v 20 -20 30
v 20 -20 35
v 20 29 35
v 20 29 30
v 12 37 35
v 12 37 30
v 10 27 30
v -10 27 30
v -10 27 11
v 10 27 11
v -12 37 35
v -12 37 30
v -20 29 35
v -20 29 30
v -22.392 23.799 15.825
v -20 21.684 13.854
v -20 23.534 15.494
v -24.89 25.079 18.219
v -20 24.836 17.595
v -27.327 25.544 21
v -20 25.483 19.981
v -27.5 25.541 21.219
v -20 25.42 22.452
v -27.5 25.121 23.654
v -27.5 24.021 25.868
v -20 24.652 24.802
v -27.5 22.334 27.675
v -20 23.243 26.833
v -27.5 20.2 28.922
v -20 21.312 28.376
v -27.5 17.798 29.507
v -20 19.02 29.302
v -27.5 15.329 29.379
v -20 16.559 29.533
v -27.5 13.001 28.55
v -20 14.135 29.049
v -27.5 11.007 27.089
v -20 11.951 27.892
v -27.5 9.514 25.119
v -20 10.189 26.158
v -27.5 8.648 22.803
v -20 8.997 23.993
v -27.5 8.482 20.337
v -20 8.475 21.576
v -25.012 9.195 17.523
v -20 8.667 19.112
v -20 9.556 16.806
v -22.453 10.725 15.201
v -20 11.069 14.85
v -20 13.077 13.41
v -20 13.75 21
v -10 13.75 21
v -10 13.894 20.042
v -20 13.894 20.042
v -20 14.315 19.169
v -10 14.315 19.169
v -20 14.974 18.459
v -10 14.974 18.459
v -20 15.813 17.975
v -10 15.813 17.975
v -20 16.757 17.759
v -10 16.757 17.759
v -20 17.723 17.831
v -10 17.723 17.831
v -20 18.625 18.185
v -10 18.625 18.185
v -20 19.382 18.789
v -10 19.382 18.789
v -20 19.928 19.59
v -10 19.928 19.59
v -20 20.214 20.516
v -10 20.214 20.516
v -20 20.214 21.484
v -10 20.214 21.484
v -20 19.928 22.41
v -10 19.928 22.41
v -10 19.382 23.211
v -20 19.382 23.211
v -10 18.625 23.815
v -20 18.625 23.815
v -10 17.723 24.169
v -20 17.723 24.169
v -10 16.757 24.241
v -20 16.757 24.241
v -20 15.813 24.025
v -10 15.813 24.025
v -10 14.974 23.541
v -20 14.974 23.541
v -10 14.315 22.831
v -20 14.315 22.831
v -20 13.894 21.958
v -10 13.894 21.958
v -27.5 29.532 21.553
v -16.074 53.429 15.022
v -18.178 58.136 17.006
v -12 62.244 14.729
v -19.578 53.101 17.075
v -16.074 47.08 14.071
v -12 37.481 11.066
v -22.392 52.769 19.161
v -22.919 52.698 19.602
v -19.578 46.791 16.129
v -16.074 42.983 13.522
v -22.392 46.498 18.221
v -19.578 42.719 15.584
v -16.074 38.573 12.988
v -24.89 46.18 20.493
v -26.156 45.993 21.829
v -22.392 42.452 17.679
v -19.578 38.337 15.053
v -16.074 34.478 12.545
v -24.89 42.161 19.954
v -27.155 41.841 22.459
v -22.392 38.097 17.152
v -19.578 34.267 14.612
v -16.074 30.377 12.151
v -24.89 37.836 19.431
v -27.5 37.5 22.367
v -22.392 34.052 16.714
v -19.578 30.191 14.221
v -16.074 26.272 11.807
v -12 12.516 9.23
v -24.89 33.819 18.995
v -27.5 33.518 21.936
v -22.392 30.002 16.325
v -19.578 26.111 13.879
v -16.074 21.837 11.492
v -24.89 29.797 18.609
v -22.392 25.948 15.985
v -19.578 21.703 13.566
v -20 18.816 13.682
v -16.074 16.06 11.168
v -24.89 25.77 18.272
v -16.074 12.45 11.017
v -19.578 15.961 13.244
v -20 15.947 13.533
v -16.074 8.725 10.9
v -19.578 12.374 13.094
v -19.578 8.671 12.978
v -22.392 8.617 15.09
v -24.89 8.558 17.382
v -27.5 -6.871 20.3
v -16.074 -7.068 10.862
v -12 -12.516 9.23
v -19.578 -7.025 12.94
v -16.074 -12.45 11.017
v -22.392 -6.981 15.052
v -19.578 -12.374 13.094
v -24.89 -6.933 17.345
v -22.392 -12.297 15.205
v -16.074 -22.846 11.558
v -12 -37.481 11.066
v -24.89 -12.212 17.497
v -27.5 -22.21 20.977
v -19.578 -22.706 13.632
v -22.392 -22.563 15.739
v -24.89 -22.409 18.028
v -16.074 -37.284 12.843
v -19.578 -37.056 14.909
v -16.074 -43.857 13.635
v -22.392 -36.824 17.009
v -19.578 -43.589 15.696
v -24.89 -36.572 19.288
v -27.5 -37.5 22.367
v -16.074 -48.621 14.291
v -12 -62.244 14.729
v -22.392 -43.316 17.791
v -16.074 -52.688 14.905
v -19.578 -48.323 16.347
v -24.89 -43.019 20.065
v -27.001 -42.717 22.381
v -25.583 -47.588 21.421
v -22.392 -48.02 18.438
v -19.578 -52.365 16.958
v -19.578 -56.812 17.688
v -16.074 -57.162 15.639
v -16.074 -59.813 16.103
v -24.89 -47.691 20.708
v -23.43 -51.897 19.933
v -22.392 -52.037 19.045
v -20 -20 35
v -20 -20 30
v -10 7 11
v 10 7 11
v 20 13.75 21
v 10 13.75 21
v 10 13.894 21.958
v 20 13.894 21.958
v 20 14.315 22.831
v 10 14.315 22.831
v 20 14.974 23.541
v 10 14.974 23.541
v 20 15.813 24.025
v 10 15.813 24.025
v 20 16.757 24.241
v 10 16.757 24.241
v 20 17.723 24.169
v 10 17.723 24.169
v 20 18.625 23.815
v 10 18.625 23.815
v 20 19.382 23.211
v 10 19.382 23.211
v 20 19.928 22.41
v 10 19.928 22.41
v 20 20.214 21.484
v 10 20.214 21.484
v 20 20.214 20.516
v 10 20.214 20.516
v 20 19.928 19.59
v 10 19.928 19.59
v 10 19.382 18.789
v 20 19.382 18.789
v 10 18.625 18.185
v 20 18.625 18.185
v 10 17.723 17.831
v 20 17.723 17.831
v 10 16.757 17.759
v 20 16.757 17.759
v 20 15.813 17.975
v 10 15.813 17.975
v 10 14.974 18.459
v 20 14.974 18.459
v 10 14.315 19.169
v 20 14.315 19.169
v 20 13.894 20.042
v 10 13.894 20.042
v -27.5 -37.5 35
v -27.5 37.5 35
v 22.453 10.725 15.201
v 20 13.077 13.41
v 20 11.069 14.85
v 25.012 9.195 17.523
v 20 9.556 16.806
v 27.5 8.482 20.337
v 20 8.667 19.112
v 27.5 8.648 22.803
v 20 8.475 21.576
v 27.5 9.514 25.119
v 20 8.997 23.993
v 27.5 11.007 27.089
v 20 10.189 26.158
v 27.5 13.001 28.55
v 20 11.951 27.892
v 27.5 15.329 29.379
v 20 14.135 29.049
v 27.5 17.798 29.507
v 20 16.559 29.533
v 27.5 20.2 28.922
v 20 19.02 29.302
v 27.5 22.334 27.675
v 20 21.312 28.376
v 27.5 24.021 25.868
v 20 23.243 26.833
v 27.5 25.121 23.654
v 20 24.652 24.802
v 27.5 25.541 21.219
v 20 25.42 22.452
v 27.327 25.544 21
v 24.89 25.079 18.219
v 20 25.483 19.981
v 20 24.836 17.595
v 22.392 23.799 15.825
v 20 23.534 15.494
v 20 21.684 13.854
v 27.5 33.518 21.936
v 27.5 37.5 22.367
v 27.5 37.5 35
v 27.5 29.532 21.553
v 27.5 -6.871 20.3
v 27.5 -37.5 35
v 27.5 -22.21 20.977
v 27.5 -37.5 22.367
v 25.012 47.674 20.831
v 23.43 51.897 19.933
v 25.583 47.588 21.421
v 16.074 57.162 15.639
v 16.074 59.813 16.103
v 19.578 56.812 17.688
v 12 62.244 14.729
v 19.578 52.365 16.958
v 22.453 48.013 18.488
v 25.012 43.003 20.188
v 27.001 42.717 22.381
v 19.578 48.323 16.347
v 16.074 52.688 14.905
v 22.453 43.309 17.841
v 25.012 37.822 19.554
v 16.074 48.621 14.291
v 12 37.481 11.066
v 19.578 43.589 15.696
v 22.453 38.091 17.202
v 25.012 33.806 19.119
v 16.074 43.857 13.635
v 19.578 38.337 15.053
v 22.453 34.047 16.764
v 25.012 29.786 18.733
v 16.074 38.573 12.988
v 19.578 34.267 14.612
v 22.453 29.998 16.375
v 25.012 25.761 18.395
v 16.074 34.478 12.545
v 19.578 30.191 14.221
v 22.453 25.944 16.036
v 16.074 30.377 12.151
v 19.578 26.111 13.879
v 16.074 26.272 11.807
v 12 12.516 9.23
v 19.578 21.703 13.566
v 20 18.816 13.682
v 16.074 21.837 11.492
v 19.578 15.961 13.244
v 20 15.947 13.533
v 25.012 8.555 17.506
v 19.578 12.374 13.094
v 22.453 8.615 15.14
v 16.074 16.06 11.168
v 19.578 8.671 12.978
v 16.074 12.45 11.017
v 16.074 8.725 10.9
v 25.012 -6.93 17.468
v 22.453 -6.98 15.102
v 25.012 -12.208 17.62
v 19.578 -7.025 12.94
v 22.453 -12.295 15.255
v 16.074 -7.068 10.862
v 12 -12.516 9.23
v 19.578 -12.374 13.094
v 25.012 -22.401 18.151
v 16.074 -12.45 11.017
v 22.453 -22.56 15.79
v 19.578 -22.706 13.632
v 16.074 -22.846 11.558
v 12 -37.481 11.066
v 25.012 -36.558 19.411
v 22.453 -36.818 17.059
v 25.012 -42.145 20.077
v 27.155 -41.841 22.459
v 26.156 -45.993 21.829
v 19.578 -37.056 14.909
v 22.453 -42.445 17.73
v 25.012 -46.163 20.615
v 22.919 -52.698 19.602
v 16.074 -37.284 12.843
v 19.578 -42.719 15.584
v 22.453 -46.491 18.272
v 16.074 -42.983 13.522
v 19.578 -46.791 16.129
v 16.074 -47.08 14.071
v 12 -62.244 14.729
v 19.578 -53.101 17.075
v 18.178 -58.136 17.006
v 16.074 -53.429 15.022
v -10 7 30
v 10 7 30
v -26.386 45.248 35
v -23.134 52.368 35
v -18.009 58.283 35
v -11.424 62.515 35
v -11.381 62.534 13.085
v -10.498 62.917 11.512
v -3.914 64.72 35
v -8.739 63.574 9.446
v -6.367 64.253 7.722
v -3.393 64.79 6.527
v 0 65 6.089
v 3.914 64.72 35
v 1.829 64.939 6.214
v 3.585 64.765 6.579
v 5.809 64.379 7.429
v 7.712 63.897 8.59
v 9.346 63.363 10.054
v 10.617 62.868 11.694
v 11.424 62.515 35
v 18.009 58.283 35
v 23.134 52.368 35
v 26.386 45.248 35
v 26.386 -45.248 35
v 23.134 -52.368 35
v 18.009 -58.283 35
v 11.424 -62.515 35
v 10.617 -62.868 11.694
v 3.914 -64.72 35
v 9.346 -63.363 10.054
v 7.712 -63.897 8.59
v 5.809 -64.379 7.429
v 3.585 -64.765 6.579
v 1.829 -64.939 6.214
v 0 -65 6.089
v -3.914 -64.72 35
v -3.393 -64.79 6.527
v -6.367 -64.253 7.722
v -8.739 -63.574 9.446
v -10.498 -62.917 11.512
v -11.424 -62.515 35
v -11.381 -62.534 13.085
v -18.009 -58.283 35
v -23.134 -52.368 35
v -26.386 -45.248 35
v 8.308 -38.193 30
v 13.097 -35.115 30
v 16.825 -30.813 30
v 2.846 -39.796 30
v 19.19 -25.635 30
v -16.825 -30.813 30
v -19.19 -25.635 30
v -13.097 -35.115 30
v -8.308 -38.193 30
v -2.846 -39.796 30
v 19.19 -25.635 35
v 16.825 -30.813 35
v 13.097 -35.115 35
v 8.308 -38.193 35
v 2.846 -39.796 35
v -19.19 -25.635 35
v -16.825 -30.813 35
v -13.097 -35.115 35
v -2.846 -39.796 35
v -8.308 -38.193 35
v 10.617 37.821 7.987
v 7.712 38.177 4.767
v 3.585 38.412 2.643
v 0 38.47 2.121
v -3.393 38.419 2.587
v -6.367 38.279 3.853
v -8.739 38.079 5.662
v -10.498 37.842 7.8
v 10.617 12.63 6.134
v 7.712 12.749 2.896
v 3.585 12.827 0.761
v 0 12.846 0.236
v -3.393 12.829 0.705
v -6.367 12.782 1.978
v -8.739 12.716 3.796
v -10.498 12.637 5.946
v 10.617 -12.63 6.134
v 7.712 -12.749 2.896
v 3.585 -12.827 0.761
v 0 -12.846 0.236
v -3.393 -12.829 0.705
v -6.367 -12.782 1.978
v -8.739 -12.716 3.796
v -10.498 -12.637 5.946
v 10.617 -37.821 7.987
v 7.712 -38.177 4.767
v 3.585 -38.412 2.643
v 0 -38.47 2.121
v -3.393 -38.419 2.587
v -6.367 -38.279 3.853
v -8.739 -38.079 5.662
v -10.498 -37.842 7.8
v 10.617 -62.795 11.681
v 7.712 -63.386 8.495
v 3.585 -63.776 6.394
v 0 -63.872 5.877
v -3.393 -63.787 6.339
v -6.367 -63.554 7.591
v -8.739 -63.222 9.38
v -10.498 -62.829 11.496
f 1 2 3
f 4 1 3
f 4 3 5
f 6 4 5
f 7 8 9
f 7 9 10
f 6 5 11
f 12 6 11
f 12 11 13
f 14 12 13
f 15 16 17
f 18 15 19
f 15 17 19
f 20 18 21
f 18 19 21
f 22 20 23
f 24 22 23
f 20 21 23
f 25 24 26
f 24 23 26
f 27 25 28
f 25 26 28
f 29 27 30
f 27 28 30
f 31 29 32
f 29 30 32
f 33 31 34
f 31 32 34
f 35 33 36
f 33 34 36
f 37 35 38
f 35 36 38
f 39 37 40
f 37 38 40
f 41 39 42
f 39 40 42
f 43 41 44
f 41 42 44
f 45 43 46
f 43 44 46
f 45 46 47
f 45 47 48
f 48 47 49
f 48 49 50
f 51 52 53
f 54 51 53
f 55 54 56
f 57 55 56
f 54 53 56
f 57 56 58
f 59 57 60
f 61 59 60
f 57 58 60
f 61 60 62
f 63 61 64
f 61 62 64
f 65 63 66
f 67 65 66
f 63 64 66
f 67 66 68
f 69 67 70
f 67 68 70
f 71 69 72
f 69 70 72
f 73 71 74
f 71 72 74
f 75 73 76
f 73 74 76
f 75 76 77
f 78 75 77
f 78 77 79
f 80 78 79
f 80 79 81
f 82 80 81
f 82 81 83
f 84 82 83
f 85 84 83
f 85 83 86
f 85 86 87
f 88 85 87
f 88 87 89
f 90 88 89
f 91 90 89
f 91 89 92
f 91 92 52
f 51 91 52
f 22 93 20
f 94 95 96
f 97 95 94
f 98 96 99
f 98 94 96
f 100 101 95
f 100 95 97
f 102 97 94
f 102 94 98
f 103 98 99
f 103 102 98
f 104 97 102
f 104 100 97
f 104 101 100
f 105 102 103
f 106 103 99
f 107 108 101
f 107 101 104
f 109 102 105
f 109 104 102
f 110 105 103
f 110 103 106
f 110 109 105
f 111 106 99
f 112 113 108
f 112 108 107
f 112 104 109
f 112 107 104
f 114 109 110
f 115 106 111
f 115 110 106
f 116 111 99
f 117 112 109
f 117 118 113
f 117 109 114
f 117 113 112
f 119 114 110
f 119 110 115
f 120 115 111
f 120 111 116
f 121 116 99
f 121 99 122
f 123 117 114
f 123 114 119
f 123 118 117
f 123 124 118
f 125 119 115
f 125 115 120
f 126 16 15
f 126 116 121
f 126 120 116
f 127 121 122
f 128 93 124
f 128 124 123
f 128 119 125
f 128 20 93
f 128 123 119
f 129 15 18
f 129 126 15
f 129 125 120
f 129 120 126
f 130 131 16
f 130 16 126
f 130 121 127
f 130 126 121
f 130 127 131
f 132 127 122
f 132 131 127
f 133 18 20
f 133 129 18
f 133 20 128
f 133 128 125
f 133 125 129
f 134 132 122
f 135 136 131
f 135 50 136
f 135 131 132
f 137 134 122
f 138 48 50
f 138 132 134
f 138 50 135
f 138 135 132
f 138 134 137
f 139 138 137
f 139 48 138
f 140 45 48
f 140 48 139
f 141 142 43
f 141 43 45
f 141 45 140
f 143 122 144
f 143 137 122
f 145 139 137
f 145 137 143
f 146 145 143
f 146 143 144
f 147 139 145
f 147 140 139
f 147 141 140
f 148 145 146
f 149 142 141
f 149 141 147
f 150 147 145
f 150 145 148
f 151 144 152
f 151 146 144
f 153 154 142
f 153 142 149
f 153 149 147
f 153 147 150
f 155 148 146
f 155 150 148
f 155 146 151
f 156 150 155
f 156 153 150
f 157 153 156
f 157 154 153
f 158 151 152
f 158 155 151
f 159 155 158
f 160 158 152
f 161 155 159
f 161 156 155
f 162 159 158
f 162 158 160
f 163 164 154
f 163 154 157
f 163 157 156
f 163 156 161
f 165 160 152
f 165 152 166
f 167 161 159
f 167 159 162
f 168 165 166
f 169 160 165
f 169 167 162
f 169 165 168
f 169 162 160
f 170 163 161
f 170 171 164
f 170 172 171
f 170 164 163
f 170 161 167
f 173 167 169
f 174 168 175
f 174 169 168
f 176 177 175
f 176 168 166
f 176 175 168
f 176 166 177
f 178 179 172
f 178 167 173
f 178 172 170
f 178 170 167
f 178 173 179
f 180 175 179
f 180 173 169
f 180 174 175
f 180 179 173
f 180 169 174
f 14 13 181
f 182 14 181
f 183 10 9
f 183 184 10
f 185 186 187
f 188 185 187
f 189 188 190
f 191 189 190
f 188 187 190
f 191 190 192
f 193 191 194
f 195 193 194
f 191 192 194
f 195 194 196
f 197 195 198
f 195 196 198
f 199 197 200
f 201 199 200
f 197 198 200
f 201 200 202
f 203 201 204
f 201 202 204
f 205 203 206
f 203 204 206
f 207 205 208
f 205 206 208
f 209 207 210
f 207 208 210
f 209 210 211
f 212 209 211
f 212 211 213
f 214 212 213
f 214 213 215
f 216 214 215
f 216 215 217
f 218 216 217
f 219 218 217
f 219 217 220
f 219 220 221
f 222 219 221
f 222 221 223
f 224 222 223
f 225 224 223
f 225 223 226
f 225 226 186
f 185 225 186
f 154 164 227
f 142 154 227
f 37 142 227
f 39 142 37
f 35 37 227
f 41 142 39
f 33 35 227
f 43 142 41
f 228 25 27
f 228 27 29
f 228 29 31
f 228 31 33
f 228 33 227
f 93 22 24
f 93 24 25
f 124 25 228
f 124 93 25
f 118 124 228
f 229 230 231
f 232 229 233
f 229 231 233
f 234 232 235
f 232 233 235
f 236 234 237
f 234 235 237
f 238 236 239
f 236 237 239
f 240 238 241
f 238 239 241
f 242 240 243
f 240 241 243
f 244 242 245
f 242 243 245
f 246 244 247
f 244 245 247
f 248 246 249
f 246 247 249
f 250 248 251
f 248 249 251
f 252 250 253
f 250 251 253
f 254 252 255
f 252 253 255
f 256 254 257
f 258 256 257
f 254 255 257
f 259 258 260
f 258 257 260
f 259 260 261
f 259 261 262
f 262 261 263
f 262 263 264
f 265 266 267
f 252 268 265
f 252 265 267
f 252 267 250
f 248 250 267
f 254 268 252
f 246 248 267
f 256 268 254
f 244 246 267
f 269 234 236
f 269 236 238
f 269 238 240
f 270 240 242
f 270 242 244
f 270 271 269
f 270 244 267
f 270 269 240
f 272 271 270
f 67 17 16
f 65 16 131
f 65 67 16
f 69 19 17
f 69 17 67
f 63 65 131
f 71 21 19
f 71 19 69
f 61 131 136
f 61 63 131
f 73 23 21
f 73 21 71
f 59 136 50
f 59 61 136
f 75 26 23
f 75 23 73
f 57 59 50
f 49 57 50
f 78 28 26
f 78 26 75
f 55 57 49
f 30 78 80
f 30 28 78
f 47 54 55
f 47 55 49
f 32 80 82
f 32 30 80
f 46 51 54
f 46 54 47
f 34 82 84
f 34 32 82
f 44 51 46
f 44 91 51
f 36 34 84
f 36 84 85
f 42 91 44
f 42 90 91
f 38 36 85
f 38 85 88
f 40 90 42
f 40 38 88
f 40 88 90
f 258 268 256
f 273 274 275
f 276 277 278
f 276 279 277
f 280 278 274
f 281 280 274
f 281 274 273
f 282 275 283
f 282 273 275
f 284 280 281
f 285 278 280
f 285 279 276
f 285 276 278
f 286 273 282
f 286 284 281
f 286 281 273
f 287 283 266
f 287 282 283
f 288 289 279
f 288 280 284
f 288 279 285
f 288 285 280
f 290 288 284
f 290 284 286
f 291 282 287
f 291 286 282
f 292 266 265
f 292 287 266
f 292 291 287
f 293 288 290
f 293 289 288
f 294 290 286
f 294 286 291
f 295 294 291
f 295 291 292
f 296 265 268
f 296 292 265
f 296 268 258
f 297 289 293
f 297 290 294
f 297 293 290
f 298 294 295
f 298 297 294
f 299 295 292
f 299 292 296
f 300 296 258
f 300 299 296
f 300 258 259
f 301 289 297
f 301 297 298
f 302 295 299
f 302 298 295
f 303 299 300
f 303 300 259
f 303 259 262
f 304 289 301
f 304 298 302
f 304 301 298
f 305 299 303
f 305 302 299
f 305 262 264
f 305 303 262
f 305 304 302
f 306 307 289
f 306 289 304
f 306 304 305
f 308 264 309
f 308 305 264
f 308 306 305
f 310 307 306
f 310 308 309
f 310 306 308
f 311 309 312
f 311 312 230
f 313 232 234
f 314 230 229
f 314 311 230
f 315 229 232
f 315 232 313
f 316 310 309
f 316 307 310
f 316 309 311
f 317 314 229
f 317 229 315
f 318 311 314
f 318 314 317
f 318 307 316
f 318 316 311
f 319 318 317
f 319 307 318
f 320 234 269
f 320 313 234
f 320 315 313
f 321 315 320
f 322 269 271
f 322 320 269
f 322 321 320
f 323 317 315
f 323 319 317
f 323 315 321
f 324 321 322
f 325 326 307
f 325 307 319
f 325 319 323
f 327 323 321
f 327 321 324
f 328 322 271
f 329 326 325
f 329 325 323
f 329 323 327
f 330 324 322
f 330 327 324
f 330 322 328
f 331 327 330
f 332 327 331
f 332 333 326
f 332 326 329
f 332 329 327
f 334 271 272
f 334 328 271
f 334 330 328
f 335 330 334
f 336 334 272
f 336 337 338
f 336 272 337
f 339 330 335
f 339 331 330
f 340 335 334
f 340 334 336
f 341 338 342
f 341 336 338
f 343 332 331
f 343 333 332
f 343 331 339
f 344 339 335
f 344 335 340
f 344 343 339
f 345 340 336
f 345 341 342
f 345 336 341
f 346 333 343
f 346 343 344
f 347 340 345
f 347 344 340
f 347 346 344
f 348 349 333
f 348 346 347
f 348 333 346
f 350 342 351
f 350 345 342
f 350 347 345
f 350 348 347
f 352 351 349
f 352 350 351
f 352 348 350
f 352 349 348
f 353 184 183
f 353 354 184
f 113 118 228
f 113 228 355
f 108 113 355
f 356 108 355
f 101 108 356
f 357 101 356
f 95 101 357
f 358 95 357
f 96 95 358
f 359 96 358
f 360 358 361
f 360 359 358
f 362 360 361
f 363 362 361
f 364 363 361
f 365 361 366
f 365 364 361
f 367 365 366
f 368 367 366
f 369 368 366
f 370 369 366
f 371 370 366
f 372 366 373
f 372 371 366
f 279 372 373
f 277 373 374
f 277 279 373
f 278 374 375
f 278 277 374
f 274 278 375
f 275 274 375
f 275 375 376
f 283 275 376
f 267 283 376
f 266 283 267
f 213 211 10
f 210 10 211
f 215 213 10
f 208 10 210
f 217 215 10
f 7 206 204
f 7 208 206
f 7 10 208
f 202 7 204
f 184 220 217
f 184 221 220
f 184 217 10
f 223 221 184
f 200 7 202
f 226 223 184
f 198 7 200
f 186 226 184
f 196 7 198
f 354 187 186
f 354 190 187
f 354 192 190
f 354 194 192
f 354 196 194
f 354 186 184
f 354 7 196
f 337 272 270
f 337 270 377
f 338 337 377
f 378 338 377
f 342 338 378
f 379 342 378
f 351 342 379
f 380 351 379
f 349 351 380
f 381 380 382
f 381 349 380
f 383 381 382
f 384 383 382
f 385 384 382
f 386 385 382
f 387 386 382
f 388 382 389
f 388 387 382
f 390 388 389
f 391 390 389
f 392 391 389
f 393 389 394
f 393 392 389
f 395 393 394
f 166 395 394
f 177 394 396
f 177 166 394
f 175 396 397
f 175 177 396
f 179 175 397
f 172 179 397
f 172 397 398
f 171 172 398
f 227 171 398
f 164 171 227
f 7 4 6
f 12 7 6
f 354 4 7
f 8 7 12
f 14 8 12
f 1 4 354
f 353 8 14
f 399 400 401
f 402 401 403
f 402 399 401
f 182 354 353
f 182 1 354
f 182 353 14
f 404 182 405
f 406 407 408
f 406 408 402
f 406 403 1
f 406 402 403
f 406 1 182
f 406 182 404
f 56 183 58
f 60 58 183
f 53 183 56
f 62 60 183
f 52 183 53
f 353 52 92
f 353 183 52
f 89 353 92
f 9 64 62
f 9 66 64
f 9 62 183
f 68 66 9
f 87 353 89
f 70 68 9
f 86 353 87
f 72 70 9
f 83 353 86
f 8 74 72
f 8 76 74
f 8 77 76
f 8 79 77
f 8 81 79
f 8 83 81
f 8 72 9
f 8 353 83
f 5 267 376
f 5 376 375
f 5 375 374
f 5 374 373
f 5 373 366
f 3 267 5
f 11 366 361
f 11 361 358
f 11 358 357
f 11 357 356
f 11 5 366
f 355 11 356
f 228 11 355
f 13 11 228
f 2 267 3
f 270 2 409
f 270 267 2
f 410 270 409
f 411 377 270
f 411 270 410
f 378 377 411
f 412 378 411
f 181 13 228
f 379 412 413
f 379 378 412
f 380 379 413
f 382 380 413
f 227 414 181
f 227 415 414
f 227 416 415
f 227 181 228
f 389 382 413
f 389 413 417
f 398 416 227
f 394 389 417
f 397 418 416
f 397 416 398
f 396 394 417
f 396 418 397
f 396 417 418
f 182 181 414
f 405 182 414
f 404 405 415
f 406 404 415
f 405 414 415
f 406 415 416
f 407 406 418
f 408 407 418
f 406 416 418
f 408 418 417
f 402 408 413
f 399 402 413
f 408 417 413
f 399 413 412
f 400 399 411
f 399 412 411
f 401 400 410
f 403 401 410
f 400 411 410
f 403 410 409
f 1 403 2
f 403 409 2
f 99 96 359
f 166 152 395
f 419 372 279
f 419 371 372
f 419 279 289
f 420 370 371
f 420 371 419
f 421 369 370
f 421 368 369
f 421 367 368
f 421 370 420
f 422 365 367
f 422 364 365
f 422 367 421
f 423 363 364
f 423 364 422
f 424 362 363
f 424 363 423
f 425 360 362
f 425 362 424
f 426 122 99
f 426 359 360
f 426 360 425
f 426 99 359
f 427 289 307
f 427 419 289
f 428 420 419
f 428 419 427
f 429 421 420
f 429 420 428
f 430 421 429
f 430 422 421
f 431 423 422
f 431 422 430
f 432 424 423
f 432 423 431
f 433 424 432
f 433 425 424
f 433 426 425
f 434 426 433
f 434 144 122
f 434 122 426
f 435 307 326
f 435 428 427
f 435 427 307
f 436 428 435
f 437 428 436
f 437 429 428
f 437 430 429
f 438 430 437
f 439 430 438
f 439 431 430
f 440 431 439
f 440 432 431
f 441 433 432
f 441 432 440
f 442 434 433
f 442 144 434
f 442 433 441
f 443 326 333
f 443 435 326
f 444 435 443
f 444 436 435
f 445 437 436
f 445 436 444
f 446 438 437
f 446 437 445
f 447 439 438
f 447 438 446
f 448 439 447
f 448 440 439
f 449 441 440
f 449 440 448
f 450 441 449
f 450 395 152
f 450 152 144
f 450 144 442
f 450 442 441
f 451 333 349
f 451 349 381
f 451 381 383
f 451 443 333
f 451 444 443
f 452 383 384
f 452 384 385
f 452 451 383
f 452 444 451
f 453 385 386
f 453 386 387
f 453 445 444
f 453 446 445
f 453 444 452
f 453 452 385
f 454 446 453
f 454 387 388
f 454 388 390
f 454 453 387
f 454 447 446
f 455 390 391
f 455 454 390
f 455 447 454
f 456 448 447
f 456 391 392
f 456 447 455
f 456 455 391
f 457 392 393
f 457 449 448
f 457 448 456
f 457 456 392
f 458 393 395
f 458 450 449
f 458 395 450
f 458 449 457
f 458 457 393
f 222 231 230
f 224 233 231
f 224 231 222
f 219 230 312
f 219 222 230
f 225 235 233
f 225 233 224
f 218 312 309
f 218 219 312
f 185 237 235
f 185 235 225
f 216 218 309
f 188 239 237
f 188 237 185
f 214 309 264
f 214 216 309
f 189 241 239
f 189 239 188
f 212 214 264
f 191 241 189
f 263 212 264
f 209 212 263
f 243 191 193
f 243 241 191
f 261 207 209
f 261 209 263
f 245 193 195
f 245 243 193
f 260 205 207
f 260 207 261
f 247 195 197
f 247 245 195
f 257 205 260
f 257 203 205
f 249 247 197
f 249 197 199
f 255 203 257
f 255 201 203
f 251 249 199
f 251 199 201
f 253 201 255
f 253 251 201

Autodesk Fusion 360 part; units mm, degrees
sketch "スケッチ2" plane through (0, 0, 0) normal (0, 0, 1) x (1, 0, 0)
  line L0 (27.5, 37.5) -> (27.5, -37.5)
  line L1 (-27.5, -37.5) -> (-27.5, 37.5)
  arc A0 (27.5, 37.5) -> (-27.5, 37.5) centre (0, 37.5) ccw
  arc A1 (-27.5, -37.5) -> (27.5, -37.5) centre (0, -37.5) ccw
  dimension "d2" = 27.5
  dimension "d3" = 75
  dimension "d4" = 37.5
extrude "押し出し1" add sketch "スケッチ2" along normal blind 50
sketch "スケッチ3" plane through (0, 0, 50) normal (0, 0, 1) x (-1, 0, 0)
  arc A0 (-27.5, -37.5) -> (27.5, -37.5) centre (0, -37.5) ccw
  line L0 (27.5, -37.5) -> (27.5, 37.5)
  arc A1 (27.5, 37.5) -> (-27.5, 37.5) centre (0, 37.5) ccw
  line L1 (-27.5, 37.5) -> (-27.5, -37.5)
  line L2 (20, -29) -> (20, 20)
  arc A2 (20, 20) -> (-20, 20) centre (0, 20) ccw
  line L3 (-20, 20) -> (-20, -29)
  line L4 (-20, -29) -> (-12, -37)
  line L5 (-12, -37) -> (12, -37)
  line L6 (12, -37) -> (20, -29)
  dimension "d7" = 20
  dimension "d8" = 57
  dimension "d9" = 24
  dimension "d45" = 20
extrude "押し出し2" cut sketch "スケッチ3" against normal blind 20 contours L2 A2 L3 L4 L5 L6
sketch "スケッチ4" plane through (0, 0, 30) normal (0, 0, 1) x (-1, 0, 0)
  line L0 (12, -37) -> (20, -29)
  line L1 (20, -29) -> (20, 20)
  arc A0 (20, 20) -> (-20, 20) centre (0, 20) ccw
  line L2 (-20, 20) -> (-20, -29)
  line L3 (-20, -29) -> (-12, -37)
  line L4 (-12, -37) -> (12, -37)
  line L5 (10, -27) -> (-10, -27)
  line L6 (-10, -27) -> (-10, -7)
  line L7 (-10, -7) -> (10, -7)
  line L8 (10, -7) -> (10, -27)
  dimension "d14" = 10
  dimension "d48" = 10
  dimension "d49" = 10
extrude "押し出し3" cut sketch "スケッチ4" against normal blind 19 contours L5 L6 L7 L8
sketch "スケッチ5" plane through (0, 0, 0) normal (0, 1, 0) x (1, 0, 0)
  arc A0 (12, -9) -> (-12, -9) centre (0, -12.5) ccw
  line L0 (35, -41.8786) -> (35, 32.3347)
  line L1 (35, 32.3347) -> (-35, 32.3347)
  line L2 (-35, 32.3347) -> (-35, -41.8786)
  line L3 (75, -350) -> (-75, -350)
  line L4 (-27.5, 0) -> (27.5, 0)
  arc A1 (35, -41.8786) -> (12, -9) centre (0, -41.8786) ccw
  arc A2 (-12, -9) -> (-35, -41.8786) centre (0, -41.8786) ccw
  dimension "d18" = 12.5
  dimension "d19" = 350
  dimension "d23" = 70
  dimension "d24" = 35
revolve "回転1" cut sketch "スケッチ5" angle 360 about axis through (75, 0, 350) along (-1, 0, 0)
sketch "スケッチ9" plane through (10, 0, 0) normal (-1, 0, 0) x (0, -1, 0)
  line L0 (-7, 30) -> (-27, 30)
  line L1 (-27, 30) -> (-27, 11)
  line L2 (-27, 11) -> (-7, 11)
  line L3 (-7, 11) -> (-7, 30)
  circle A0 centre (-17, 21) radius 3.25
  dimension "d31" = 6.5
  dimension "d32" = 9
  dimension "d33" = 10
extrude "押し出し6" cut sketch "スケッチ9" along normal through all and the other way through all contours A0
sketch "スケッチ14" plane through (0, 0, 0) normal (1, 0, 0) x (0, 1, 0)
  circle A0 centre (17, 21) radius 8.544
  point P0 (17, 21)
  dimension "d40" = 17.088
extrude "押し出し8" cut sketch "スケッチ14" along normal blind 20 from surface at 20
mirror "ミラー1" about plane through (0, 0, 0) normal (1, 0, 0) of "押し出し8"
sketch "スケッチ15" plane through (0, 0, 50) normal (0, 0, 1) x (-1, 0, 0)
  line L0 (20, 20) -> (20, -29)
  line L1 (20, -29) -> (12, -37)
  line L2 (12, -37) -> (-12, -37)
  line L3 (-12, -37) -> (-20, -29)
  line L4 (-20, -29) -> (-20, 20)
  arc A0 (20, 20) -> (-20, 20) centre (0, 20) ccw
  arc A1 (-27.5, -37.5) -> (27.5, -37.5) centre (0, -37.5) ccw
  line L5 (27.5, -37.5) -> (27.5, 37.5)
  arc A2 (27.5, 37.5) -> (-27.5, 37.5) centre (0, 37.5) ccw
  line L6 (-27.5, 37.5) -> (-27.5, -37.5)
  line L7 (42.7311, -72.162) -> (-49.8708, -72.162)
  line L8 (-49.8708, -72.162) -> (-49.8708, 74.8211)
  line L9 (-49.8708, 74.8211) -> (42.7311, 74.8211)
  line L10 (42.7311, 74.8211) -> (42.7311, -72.162)
extrude "押し出し9" cut sketch "スケッチ15" against normal blind 15 contours A1 L5 A2 L6
